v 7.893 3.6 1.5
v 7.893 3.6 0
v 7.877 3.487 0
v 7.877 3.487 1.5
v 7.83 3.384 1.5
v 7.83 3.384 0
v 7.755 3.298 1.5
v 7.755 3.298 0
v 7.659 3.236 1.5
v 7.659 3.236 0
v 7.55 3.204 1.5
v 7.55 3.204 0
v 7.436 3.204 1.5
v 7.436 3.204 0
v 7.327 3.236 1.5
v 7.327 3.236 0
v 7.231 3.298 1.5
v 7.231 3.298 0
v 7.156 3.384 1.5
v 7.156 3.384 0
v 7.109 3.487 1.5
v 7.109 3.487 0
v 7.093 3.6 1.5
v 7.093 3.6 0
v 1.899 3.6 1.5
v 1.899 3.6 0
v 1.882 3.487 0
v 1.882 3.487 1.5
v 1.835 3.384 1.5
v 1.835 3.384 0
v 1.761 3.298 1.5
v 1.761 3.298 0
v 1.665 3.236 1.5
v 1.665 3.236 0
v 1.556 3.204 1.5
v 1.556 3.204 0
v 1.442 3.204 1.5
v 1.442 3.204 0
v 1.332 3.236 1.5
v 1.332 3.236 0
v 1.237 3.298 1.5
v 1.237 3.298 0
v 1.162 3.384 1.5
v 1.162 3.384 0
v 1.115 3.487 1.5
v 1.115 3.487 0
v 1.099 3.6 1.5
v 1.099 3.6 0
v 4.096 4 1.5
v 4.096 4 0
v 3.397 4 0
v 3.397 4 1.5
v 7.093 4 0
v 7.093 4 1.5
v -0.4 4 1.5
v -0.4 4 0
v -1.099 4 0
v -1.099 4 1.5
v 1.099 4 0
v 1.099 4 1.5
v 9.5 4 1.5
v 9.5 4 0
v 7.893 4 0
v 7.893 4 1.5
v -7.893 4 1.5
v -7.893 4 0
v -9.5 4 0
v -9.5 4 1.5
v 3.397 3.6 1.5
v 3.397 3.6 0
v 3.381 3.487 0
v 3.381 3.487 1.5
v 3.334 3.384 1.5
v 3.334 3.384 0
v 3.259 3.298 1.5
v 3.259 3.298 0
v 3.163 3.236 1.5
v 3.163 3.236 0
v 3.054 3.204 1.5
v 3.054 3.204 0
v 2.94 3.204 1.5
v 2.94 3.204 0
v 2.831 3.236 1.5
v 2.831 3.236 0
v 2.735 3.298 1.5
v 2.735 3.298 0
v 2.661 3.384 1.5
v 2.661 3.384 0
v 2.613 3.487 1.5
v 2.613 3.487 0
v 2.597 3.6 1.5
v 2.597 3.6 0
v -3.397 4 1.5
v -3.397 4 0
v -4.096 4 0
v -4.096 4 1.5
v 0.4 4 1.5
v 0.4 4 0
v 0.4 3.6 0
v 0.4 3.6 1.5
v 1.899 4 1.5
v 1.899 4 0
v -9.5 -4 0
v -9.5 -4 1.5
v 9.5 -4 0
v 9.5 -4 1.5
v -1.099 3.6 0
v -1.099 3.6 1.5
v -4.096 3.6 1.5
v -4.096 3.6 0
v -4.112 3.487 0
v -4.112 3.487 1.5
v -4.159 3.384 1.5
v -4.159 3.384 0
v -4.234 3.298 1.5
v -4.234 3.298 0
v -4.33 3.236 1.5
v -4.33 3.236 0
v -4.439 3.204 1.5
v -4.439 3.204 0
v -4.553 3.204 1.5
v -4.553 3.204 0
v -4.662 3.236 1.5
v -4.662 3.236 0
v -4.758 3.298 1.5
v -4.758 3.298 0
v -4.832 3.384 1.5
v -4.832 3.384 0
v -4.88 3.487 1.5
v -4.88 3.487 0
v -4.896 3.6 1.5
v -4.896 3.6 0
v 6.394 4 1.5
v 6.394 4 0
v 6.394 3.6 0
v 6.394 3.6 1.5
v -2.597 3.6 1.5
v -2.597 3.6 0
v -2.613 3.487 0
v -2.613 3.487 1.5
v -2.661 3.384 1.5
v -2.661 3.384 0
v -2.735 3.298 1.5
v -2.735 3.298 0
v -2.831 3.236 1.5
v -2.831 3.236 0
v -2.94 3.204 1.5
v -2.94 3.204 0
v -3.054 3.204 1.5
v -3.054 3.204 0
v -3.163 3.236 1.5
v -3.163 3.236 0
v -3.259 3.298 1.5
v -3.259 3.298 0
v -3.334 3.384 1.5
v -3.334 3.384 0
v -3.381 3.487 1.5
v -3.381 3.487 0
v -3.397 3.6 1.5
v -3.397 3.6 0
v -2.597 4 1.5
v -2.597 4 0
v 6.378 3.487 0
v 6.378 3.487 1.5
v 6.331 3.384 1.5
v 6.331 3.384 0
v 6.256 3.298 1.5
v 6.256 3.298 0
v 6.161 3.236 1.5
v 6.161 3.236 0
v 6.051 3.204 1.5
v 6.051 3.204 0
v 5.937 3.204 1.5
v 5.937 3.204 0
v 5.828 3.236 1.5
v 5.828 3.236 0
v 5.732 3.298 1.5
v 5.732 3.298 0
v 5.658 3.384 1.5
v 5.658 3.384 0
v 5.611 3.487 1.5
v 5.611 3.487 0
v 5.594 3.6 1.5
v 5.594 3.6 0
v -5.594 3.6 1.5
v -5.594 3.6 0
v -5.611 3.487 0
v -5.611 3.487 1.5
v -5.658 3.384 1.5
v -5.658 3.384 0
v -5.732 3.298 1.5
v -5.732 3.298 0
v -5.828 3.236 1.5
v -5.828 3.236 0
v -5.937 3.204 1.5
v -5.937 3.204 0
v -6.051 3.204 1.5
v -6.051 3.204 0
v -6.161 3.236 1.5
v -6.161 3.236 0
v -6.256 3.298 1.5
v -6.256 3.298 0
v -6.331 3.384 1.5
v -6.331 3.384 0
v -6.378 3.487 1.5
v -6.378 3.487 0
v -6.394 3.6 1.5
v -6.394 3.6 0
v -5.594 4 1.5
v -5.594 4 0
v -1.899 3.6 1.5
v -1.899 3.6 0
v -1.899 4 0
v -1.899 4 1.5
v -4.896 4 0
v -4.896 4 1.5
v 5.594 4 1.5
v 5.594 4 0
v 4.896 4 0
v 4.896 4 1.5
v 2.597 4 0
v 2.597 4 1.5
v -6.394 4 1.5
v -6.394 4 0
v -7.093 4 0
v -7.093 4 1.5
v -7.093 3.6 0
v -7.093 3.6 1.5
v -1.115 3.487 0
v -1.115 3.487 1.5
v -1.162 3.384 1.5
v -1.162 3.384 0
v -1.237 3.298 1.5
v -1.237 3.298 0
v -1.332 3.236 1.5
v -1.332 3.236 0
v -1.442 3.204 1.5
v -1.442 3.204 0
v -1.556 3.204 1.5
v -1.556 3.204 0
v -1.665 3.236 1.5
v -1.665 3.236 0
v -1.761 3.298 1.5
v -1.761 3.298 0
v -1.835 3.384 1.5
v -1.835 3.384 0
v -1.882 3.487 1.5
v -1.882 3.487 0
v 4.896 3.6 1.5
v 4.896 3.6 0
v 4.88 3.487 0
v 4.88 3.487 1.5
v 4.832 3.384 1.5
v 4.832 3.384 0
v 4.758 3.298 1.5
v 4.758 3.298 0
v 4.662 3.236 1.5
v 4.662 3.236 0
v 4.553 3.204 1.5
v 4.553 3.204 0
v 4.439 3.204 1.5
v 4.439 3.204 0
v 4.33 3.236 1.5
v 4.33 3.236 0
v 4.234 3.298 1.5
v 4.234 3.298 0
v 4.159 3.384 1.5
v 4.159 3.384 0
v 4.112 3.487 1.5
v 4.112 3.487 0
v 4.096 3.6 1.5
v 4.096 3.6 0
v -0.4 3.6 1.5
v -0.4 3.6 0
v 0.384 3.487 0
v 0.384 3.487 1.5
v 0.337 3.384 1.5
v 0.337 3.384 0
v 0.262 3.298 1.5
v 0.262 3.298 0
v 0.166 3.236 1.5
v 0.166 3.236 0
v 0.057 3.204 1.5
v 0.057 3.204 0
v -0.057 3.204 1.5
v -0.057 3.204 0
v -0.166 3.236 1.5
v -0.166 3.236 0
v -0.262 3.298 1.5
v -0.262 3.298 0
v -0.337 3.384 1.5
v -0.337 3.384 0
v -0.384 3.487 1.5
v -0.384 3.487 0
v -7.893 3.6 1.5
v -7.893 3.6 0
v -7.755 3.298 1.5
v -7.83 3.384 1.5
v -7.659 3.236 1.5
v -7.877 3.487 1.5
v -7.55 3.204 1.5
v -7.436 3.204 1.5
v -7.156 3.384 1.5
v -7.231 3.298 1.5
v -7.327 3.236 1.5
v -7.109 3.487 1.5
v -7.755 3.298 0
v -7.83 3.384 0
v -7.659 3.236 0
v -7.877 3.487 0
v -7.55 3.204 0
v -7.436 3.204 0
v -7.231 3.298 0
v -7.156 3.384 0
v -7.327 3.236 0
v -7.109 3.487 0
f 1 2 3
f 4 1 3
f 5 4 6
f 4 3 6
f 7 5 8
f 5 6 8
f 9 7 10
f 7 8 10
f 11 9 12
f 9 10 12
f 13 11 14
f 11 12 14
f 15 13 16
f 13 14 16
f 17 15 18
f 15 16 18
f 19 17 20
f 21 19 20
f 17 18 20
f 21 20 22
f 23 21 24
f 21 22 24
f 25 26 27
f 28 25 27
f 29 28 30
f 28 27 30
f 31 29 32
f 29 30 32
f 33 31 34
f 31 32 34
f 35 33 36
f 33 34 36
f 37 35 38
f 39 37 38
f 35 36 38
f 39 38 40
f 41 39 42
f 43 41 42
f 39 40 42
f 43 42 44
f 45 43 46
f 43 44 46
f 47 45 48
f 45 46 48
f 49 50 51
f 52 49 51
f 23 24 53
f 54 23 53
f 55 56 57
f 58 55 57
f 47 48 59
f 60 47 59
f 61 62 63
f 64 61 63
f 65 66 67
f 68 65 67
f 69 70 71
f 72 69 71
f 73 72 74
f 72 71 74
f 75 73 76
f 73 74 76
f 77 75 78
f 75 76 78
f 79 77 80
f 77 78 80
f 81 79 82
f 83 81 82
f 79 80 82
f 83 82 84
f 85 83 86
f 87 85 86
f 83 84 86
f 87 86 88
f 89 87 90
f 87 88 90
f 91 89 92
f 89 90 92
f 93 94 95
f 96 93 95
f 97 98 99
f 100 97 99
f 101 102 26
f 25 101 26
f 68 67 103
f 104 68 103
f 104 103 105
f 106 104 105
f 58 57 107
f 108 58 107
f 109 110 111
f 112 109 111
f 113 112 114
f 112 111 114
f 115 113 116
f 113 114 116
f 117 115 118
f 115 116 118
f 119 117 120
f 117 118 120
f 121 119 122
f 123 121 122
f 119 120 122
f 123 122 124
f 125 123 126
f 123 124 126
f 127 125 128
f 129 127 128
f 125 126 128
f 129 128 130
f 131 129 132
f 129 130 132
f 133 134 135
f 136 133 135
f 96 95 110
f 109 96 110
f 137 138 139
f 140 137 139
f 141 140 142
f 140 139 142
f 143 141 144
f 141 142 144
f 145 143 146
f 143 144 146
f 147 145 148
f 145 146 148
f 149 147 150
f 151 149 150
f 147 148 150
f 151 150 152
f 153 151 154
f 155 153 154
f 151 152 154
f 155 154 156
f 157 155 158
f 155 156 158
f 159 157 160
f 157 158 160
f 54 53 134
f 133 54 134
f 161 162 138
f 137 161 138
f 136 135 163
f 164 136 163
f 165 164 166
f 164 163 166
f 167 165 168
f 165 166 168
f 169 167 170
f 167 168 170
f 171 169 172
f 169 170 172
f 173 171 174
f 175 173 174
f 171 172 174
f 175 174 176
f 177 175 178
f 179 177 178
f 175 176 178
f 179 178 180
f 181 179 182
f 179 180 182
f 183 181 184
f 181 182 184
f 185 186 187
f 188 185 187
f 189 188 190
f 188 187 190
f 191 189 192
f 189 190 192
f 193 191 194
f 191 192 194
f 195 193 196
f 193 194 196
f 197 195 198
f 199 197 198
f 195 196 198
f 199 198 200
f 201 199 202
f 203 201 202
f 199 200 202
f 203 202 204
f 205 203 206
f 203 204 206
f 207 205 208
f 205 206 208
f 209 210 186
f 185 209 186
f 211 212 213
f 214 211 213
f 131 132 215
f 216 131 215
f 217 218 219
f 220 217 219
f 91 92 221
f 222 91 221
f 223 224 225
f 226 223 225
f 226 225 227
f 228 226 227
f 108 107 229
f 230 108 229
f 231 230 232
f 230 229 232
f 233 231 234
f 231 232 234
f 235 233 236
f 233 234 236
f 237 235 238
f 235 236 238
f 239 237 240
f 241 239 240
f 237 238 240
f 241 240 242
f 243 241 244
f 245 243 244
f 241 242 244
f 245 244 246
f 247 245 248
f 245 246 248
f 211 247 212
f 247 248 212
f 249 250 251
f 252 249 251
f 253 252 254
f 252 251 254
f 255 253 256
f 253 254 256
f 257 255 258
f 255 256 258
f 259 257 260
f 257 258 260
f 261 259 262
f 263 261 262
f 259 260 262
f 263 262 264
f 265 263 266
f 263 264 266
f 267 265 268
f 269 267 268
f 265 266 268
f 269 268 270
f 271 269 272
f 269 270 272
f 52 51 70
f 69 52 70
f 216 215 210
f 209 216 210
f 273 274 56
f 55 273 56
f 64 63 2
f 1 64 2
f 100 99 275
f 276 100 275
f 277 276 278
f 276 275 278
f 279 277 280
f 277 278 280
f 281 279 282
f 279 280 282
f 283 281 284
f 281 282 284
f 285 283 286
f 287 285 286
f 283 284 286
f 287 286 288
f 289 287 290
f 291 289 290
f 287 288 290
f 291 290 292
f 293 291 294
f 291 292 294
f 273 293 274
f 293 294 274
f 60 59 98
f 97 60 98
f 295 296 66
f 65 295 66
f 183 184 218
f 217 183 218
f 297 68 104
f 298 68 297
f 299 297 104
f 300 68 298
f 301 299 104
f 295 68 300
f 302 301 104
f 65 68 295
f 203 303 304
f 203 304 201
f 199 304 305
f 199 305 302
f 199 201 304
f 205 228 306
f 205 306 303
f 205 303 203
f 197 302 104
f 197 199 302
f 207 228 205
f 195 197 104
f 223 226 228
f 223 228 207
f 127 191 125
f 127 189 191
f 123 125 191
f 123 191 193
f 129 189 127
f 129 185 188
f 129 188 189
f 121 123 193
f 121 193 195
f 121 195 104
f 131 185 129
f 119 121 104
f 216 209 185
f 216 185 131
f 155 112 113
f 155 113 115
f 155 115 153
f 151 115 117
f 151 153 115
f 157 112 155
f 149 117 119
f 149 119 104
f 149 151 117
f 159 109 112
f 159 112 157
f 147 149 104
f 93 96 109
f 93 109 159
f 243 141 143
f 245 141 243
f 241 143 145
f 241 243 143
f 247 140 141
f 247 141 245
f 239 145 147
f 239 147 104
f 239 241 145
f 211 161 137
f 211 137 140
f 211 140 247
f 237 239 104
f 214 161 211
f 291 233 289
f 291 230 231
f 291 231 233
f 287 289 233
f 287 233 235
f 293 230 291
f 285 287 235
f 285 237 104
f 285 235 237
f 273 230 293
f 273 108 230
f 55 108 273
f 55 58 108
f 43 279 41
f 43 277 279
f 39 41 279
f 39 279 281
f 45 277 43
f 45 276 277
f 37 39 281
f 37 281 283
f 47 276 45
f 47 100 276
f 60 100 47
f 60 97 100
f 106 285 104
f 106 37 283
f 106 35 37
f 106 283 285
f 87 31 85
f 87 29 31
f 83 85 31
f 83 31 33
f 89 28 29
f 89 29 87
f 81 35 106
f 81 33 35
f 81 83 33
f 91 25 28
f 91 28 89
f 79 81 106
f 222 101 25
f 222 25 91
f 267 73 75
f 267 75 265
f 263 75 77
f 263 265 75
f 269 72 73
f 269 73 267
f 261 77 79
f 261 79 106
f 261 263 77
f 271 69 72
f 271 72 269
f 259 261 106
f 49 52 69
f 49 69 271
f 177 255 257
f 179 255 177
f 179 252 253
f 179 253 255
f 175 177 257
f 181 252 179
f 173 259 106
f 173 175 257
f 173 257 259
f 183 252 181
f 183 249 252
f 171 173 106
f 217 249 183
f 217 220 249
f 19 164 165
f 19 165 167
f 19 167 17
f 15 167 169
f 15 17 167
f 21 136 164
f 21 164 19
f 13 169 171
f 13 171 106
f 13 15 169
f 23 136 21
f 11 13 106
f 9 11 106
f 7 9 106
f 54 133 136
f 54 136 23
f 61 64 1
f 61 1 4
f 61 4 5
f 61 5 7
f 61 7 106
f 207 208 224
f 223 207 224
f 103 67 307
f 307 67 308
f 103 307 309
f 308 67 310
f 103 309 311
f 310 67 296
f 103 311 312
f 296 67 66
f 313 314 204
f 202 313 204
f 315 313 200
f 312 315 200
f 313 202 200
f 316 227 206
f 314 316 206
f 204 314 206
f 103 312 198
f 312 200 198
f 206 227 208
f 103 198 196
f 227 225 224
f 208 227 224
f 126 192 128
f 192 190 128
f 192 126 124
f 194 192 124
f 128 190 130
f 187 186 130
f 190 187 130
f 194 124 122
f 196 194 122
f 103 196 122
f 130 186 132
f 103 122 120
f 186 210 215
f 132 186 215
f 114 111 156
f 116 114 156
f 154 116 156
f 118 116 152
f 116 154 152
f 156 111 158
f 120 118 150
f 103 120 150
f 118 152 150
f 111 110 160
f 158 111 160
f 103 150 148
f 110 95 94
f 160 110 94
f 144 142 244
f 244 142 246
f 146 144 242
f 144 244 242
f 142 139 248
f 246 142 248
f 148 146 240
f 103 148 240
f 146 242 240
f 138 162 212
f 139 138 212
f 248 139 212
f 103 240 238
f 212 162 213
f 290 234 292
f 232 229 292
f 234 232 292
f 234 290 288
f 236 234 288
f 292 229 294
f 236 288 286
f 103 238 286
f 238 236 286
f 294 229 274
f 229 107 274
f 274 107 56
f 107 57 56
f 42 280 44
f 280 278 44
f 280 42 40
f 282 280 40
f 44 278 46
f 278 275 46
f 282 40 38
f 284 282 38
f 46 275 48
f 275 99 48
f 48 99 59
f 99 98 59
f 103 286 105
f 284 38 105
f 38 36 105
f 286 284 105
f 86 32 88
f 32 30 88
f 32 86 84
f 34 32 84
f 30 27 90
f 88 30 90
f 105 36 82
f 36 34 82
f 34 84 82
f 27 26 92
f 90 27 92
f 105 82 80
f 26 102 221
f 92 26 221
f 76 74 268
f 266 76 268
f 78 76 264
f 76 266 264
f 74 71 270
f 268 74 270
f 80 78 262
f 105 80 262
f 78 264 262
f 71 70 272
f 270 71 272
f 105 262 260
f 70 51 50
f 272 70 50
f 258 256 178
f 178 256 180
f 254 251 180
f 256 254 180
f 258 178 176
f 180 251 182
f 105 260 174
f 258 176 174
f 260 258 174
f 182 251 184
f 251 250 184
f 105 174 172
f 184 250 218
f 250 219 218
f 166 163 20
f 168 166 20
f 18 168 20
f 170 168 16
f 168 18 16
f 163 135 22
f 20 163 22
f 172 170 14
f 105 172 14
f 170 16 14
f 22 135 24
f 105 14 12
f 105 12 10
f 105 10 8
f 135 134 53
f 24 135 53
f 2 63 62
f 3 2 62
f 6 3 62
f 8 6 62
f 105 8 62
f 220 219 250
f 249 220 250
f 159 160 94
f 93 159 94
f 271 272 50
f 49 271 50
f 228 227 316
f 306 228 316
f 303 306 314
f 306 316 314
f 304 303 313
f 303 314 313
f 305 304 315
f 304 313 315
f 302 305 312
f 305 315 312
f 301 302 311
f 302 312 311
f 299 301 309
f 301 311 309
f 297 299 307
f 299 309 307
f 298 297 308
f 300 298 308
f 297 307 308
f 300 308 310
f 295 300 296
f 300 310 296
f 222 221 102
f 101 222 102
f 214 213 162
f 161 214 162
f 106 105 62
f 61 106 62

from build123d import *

# Parameters (mm, degrees)
F1_DEPTH = 1.5


with BuildPart() as f1:
    # F0 (on Top) → F1 (new body)
    with BuildSketch(Plane.XY):
        with BuildLine():
            Line((-7.893, 4), (-9.5, 4))
            Line((-9.5, 4), (-9.5, -4))
            Line((-9.5, -4), (9.5, -4))
            Line((9.5, -4), (9.5, 4))
            Line((9.5, 4), (7.893, 4))
            Line((7.893, 4), (7.893, 3.6))
            ThreePointArc((7.893, 3.6), (7.493, 3.2), (7.093, 3.6))
            Line((7.093, 3.6), (7.093, 4))
            Line((7.093, 4), (6.3944, 4))
            Line((6.3944, 4), (6.3944, 3.6))
            ThreePointArc((6.3944, 3.6), (5.9944, 3.2), (5.5944, 3.6))
            Line((5.5944, 3.6), (5.5944, 4))
            Line((5.5944, 4), (4.8958, 4))
            Line((4.8958, 4), (4.8958, 3.6))
            ThreePointArc((4.8958, 3.6), (4.4958, 3.2), (4.0958, 3.6))
            Line((4.0958, 3.6), (4.0958, 4))
            Line((4.0958, 4), (3.3972, 4))
            Line((3.3972, 4), (3.3972, 3.6))
            ThreePointArc((3.3972, 3.6), (2.9972, 3.2), (2.5972, 3.6))
            Line((2.5972, 3.6), (2.5972, 4))
            Line((2.5972, 4), (1.8986, 4))
            Line((1.8986, 4), (1.8986, 3.6))
            ThreePointArc((1.8986, 3.6), (1.4986, 3.2), (1.0986, 3.6))
            Line((1.0986, 3.6), (1.0986, 4))
            Line((1.0986, 4), (0.4, 4))
            Line((0.4, 4), (0.4, 3.6))
            ThreePointArc((0.4, 3.6), (0, 3.2), (-0.4, 3.6))
            Line((-0.4, 3.6), (-0.4, 4))
            Line((-0.4, 4), (-1.0986, 4))
            Line((-1.0986, 4), (-1.0986, 3.6))
            ThreePointArc((-1.0986, 3.6), (-1.4986, 3.2), (-1.8986, 3.6))
            Line((-1.8986, 3.6), (-1.8986, 4))
            Line((-1.8986, 4), (-2.5972, 4))
            Line((-2.5972, 4), (-2.5972, 3.6))
            ThreePointArc((-2.5972, 3.6), (-2.9972, 3.2), (-3.3972, 3.6))
            Line((-3.3972, 3.6), (-3.3972, 4))
            Line((-3.3972, 4), (-4.0958, 4))
            Line((-4.0958, 4), (-4.0958, 3.6))
            ThreePointArc((-4.0958, 3.6), (-4.4958, 3.2), (-4.8958, 3.6))
            Line((-4.8958, 3.6), (-4.8958, 4))
            Line((-4.8958, 4), (-5.5944, 4))
            Line((-5.5944, 4), (-5.5944, 3.6))
            ThreePointArc((-5.5944, 3.6), (-5.9944, 3.2), (-6.3944, 3.6))
            Line((-6.3944, 3.6), (-6.3944, 4))
            Line((-6.3944, 4), (-7.093, 4))
            Line((-7.093, 4), (-7.093, 3.6))
            ThreePointArc((-7.093, 3.6), (-7.493, 3.2), (-7.893, 3.6))
            Line((-7.893, 3.6), (-7.893, 4))
        make_face()
    extrude(amount=F1_DEPTH)


solid = f1.part
